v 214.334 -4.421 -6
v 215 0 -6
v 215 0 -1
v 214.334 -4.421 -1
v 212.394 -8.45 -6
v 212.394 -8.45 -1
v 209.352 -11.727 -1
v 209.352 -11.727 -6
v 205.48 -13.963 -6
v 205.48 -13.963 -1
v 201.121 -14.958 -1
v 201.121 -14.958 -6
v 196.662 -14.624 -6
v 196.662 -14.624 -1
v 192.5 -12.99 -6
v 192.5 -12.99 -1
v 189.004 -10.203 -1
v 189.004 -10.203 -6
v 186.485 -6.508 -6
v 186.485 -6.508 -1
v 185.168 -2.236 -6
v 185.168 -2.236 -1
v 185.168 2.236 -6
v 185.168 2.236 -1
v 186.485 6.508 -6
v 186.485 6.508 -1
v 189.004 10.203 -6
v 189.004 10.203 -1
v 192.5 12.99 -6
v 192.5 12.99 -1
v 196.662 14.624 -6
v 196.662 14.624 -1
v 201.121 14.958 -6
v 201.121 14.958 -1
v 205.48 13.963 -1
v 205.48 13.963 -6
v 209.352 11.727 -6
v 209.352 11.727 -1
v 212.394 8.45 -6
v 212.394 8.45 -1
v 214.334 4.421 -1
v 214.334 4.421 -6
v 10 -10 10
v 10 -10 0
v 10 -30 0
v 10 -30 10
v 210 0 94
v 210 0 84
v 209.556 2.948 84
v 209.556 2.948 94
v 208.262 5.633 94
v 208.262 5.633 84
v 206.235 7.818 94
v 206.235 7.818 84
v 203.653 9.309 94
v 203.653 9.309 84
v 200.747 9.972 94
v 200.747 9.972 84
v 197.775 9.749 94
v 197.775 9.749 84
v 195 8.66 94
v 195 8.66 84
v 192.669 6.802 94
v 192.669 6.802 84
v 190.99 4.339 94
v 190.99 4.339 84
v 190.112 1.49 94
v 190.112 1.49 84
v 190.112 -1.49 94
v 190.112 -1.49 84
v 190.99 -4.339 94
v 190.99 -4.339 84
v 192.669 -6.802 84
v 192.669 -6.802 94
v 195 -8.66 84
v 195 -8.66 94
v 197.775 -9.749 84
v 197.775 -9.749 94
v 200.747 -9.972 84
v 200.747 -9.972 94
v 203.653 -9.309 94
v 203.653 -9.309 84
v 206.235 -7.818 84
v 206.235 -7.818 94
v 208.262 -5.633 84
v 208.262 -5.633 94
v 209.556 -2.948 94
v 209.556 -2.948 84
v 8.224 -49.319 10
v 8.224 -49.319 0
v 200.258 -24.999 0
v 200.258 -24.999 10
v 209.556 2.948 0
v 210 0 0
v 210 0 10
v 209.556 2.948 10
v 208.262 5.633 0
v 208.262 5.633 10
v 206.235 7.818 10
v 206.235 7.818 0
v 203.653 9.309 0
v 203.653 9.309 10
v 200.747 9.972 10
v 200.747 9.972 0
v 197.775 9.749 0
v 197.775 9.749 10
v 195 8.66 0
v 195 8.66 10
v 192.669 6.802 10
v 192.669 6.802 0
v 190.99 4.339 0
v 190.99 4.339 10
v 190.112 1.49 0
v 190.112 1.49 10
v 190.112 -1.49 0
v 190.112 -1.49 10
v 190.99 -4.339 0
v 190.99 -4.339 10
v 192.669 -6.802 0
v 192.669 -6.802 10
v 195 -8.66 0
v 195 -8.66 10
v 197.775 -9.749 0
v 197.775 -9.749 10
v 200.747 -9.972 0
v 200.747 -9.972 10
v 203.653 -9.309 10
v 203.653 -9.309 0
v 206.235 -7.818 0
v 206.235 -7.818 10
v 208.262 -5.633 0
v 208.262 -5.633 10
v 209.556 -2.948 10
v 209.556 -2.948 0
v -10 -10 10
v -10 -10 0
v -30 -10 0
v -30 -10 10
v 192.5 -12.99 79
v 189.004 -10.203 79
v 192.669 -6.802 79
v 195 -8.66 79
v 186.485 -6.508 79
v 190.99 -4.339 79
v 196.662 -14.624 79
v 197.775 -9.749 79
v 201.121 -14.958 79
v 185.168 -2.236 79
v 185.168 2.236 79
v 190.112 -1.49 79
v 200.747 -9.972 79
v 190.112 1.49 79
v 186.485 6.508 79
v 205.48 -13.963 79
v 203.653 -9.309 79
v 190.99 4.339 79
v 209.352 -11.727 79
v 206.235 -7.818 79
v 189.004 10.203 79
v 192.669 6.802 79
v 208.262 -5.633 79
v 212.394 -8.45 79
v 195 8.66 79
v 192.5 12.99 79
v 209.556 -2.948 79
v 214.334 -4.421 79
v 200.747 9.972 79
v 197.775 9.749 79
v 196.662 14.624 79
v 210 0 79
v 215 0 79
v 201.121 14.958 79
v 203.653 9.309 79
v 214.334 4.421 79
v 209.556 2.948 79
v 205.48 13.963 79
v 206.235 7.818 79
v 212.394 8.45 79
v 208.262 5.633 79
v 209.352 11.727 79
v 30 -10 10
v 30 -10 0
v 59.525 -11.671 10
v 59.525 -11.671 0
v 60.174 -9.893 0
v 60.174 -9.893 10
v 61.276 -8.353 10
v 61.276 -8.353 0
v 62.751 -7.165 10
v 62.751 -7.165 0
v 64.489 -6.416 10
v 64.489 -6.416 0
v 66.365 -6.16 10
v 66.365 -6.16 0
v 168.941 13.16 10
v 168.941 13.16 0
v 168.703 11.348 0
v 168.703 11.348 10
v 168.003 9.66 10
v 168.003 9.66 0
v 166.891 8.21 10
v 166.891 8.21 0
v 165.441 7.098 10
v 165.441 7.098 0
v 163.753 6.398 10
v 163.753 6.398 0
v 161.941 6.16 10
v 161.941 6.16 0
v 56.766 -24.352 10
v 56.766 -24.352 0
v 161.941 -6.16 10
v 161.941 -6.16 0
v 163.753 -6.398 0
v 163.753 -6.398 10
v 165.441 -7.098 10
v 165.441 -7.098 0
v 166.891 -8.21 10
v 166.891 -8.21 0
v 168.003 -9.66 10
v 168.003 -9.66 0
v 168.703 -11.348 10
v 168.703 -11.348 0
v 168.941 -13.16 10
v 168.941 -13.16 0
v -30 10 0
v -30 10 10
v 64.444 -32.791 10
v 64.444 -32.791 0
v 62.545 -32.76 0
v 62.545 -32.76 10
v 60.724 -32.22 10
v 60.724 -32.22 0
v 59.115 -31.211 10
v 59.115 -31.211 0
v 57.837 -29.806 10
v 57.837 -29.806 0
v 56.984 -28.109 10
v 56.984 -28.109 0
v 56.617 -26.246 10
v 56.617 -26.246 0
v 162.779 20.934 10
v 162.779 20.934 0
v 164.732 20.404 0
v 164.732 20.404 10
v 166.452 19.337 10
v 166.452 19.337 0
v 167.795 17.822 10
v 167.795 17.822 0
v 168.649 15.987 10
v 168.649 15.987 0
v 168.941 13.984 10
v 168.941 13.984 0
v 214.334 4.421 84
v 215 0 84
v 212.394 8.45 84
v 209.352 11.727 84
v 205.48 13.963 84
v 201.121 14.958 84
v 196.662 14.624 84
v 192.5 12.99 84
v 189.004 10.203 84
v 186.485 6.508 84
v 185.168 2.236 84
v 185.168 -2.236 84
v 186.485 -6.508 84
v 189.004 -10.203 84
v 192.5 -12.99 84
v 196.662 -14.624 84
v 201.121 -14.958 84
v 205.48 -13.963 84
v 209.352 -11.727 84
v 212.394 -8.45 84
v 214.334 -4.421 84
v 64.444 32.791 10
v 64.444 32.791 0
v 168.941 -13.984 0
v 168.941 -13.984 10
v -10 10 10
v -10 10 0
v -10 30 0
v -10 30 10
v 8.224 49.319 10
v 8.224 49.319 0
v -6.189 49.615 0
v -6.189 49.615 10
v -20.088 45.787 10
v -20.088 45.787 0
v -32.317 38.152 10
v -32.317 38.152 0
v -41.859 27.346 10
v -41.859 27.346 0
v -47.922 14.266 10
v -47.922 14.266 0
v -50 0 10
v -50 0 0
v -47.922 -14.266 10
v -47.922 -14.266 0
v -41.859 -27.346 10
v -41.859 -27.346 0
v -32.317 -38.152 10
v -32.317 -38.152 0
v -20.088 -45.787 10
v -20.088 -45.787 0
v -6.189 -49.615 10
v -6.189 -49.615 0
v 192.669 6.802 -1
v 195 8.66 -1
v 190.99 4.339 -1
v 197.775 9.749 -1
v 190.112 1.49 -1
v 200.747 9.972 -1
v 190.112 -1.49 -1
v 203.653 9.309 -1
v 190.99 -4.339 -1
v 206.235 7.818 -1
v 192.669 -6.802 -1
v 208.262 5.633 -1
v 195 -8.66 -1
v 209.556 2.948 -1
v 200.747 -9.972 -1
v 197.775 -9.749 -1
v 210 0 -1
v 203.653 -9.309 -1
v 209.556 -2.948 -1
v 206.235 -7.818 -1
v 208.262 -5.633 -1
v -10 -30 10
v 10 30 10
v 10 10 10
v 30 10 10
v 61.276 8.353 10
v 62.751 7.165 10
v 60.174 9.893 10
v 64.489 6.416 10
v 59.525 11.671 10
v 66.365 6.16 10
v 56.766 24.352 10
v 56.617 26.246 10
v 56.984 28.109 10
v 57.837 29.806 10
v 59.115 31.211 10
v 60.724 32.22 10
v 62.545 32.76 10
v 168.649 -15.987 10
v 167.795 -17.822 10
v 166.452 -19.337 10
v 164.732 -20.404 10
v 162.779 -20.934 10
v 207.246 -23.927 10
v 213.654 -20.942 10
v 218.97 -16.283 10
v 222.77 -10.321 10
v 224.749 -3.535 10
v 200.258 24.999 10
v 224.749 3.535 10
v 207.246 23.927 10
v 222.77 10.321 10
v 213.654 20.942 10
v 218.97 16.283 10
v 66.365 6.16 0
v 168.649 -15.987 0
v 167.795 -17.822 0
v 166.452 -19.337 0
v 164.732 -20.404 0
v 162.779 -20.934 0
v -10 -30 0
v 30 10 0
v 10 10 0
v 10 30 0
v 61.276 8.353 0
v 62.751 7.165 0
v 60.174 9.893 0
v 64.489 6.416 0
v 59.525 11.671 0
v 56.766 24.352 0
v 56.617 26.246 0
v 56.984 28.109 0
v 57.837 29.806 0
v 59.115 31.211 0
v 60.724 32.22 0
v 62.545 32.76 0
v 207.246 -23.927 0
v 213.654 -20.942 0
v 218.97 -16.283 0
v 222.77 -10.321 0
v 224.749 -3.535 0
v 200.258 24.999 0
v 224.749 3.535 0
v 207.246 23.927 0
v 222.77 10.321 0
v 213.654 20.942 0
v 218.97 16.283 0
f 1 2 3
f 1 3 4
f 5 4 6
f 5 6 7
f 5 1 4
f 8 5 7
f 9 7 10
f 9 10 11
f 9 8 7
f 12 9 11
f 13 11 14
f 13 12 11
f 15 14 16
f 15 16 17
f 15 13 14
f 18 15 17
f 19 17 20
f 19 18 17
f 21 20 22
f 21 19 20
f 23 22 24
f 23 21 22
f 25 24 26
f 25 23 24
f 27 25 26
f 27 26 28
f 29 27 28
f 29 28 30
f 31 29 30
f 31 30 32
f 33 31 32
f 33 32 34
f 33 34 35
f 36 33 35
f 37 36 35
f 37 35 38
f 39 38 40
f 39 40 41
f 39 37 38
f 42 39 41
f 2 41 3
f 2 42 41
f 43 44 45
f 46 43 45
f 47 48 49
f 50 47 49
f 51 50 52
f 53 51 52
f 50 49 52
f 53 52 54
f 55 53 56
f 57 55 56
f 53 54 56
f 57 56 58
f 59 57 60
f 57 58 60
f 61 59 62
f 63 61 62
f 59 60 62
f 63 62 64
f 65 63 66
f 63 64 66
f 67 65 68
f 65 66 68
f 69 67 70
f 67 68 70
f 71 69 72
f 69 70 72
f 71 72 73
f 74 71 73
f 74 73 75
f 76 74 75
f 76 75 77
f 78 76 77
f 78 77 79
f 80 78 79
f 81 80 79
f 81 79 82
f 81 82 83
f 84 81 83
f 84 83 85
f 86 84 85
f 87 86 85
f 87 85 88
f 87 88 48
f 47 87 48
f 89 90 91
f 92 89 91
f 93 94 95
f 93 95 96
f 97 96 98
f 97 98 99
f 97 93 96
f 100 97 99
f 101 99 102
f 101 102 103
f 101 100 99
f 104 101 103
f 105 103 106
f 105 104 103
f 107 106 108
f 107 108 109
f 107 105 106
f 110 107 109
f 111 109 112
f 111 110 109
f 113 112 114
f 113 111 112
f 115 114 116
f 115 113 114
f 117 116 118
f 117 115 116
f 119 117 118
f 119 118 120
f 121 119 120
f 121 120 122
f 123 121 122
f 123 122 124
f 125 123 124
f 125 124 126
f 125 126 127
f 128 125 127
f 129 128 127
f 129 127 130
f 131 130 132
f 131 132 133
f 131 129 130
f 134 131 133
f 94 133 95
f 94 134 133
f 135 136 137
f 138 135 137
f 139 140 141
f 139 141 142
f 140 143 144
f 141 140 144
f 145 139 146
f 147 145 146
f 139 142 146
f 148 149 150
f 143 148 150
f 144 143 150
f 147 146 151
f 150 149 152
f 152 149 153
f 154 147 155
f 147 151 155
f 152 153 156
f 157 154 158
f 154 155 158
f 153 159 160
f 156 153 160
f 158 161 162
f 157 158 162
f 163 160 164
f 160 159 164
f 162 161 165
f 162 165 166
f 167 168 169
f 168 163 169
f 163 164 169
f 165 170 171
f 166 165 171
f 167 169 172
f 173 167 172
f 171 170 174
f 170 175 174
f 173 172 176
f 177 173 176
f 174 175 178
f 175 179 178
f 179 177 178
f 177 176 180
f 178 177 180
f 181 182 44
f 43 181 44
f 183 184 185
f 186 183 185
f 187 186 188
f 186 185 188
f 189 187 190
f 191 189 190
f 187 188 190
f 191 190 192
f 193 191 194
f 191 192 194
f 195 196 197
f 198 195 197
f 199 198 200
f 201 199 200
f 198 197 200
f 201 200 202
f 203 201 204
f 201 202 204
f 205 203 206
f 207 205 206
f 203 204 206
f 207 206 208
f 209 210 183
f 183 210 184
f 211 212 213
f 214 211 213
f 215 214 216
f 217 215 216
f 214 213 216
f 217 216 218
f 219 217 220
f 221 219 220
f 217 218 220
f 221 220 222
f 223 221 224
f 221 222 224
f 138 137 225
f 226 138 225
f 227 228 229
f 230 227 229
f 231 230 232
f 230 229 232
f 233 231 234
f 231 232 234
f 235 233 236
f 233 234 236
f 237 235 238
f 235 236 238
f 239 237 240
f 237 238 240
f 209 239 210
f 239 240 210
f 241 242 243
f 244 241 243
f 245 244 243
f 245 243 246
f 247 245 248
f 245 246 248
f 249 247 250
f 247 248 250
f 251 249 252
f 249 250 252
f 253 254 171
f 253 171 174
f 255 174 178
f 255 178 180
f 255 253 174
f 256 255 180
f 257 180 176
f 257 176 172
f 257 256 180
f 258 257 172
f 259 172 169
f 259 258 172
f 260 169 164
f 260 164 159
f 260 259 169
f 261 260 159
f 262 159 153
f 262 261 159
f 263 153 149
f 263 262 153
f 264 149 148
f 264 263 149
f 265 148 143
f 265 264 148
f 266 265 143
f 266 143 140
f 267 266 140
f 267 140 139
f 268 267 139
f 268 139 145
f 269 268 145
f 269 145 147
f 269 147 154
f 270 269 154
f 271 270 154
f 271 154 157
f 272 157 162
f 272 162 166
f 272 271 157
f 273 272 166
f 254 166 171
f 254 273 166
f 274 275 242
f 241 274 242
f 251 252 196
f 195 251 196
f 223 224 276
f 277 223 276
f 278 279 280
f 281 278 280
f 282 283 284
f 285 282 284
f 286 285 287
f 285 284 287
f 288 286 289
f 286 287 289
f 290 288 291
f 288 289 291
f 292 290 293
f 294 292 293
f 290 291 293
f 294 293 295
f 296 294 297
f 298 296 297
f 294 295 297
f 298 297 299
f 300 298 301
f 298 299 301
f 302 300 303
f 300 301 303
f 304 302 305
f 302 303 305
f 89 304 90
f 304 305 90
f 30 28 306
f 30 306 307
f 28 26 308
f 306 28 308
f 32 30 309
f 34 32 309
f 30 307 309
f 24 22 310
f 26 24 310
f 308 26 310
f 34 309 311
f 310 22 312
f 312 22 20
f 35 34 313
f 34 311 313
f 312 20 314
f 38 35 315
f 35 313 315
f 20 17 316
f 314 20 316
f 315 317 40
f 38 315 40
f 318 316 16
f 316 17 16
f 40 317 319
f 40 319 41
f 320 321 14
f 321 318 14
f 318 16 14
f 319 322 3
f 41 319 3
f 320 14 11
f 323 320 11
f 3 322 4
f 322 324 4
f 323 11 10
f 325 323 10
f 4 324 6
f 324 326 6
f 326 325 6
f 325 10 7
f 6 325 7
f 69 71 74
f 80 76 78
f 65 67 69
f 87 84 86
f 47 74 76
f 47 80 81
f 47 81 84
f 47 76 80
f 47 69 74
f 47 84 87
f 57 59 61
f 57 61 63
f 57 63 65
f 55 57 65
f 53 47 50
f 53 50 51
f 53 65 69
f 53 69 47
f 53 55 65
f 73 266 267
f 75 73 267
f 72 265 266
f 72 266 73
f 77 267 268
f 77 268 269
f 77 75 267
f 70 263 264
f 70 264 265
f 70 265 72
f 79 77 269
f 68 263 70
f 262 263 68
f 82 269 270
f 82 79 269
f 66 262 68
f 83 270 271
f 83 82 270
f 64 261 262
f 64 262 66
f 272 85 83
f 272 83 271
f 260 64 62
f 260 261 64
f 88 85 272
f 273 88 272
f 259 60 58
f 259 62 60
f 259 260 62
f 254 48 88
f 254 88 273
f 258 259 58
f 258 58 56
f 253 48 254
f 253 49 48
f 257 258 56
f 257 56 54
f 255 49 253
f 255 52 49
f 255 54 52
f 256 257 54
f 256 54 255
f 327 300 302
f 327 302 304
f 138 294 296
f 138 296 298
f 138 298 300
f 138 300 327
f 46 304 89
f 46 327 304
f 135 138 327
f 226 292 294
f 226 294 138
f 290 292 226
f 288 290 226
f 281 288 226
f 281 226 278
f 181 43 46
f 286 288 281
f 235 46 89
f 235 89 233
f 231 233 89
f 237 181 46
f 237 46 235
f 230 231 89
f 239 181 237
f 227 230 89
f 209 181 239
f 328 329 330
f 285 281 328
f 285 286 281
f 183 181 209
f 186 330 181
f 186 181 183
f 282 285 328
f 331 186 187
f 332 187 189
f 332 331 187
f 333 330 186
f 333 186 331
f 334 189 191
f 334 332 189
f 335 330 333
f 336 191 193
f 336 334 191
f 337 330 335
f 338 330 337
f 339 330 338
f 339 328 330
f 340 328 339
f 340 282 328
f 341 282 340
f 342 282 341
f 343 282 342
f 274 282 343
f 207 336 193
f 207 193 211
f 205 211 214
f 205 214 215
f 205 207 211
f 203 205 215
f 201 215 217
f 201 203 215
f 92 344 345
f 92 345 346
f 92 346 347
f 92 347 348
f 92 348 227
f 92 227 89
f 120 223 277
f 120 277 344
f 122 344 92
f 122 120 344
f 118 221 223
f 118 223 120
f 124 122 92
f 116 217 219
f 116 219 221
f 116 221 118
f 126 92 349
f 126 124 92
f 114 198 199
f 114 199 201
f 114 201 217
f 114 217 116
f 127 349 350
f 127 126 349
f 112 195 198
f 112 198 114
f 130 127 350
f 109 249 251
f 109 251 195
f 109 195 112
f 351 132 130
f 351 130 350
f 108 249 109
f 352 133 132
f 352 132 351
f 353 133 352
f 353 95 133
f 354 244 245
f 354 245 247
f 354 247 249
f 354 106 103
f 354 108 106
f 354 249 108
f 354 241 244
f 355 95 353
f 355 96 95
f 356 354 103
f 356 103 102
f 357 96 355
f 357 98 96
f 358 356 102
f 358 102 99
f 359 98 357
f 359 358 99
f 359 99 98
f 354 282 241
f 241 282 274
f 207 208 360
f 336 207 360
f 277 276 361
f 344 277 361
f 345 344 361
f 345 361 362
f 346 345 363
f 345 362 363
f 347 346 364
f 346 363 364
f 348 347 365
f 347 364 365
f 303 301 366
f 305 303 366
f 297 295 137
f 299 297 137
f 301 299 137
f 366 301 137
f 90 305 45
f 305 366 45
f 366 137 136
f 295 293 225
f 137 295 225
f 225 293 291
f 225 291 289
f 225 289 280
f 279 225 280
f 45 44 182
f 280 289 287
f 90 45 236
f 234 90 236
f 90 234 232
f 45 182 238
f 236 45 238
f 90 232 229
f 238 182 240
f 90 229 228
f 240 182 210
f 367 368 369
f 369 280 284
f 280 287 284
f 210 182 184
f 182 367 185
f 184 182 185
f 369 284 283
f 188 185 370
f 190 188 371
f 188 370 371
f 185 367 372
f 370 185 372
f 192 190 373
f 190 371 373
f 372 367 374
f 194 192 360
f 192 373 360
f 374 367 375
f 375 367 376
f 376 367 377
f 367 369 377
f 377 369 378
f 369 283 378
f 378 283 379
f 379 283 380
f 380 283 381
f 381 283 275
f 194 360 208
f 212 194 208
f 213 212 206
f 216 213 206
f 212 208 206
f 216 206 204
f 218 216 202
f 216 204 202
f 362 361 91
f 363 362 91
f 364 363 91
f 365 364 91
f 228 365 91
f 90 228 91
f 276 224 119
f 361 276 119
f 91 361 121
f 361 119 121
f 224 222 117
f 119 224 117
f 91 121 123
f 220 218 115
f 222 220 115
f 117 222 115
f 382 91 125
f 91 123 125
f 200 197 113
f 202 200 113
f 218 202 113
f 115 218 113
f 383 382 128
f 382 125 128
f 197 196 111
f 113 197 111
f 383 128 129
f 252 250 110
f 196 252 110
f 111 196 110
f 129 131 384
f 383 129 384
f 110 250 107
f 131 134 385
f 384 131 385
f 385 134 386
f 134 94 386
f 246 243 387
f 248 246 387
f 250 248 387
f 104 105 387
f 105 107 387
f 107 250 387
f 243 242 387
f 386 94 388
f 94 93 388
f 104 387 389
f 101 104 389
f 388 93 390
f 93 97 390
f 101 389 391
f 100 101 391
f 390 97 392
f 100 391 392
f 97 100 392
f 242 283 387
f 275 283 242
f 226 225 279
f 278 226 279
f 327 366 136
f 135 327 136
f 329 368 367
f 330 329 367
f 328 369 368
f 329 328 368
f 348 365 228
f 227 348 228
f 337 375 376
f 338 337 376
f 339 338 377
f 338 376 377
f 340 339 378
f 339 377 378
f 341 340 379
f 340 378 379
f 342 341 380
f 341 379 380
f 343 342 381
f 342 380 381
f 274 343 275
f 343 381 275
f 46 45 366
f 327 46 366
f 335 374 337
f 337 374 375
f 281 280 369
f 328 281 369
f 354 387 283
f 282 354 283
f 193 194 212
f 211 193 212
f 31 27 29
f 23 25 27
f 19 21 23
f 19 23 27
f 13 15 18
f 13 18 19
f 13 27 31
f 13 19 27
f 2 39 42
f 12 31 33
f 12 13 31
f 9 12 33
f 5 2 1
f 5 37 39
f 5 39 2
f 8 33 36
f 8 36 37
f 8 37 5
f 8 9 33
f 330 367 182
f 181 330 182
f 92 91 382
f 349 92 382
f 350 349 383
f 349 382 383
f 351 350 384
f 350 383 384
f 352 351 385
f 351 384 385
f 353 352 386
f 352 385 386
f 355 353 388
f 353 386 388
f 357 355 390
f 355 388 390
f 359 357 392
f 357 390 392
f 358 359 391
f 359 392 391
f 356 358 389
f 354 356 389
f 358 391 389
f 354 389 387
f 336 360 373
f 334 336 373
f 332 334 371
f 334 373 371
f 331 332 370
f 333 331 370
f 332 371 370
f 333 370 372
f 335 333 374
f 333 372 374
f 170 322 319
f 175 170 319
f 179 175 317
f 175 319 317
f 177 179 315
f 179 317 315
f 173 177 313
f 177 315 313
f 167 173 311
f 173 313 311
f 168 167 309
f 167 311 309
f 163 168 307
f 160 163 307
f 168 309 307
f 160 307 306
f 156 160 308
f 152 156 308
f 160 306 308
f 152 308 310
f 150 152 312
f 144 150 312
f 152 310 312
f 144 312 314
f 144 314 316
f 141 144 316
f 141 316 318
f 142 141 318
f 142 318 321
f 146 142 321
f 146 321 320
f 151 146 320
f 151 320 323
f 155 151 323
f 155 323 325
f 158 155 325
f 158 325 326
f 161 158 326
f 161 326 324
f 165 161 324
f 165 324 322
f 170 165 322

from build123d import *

# Parameters (mm, degrees)
F0_R     = 10
F1_DEPTH = 10
F2_R     = 10
F3_DEPTH = 100
F5_R     = 15
F5_R_2   = 10
F6_DEPTH = 5
F8_R     = 15
F8_R_2   = 10
F9_DEPTH = 5


with BuildPart() as f1:
    # F0 (on Top) → F1 (new body)
    with BuildSketch(Plane.XY):
        with BuildLine():
            ThreePointArc((8.2239713528, -49.3190256918), (38.1523168866, -32.3171891751), (50, 0))
            ThreePointArc((50, 0), (38.1523168866, 32.3171891751), (8.2239713528, 49.3190256918))
            ThreePointArc((8.2239713528, 49.3190256918), (-50, 0), (8.2239713528, -49.3190256918))
        make_face()
        Polygon((-10, 30), (0, 30), (10, 30), (10, 10), (30, 10), (30, 0), (30, -10), (10, -10), (10, -30), (0, -30), (-10, -30), (-10, -10), (-30, -10), (-30, 0), (-30, 10), (-10, 10), align=None, mode=Mode.SUBTRACT)
        with BuildLine():
            ThreePointArc((8.2239713528, 49.3190256918), (38.1523168866, 32.3171891751), (50, 0))
            ThreePointArc((50, 0), (38.1523168866, -32.3171891751), (8.2239713528, -49.3190256918))
            Line((8.2239713528, -49.3190256918), (200.2583432018, -24.9986651402))
            ThreePointArc((200.2583432018, -24.9986651402), (175, 0), (200.2583432018, 24.9986651402))
            Line((200.2583432018, 24.9986651402), (8.2239713528, 49.3190256918))
        make_face()
        with BuildLine():
            ThreePointArc((59.525263062, -11.6714409544), (61.973089813, -7.7092140579), (66.3651927926, -6.1598499306))
            Line((66.3651927926, -6.1598499306), (161.9411855936, -6.1598499306))
            ThreePointArc((161.9411855936, -6.1598499306), (166.8909330619, -8.2101024622), (168.9411855936, -13.1598499306))
            Line((168.9411855936, -13.1598499306), (168.9411855936, -13.984257154))
            ThreePointArc((168.9411855936, -13.984257154), (167.1788181219, -18.6283077027), (162.7791268797, -20.9339229302))
            Line((162.7791268797, -20.9339229302), (64.4436745019, -32.7905125979))
            ThreePointArc((64.4436745019, -32.7905125979), (58.428258667, -30.5518719008), (56.7658034852, -24.3524378455))
            Line((56.7658034852, -24.3524378455), (59.525263062, -11.6714409544))
        make_face(mode=Mode.SUBTRACT)
        with BuildLine():
            Line((59.525263062, 11.6714409544), (56.7658034852, 24.3524378455))
            ThreePointArc((56.7658034852, 24.3524378455), (58.428258667, 30.5518719008), (64.4436745019, 32.7905125979))
            Line((64.4436745019, 32.7905125979), (162.7791268797, 20.9339229302))
            ThreePointArc((162.7791268797, 20.9339229302), (167.1788181219, 18.6283077027), (168.9411855936, 13.984257154))
            Line((168.9411855936, 13.984257154), (168.9411855936, 13.1598499306))
            ThreePointArc((168.9411855936, 13.1598499306), (166.8909330619, 8.2101024622), (161.9411855936, 6.1598499306))
            Line((161.9411855936, 6.1598499306), (66.3651927926, 6.1598499306))
            ThreePointArc((66.3651927926, 6.1598499306), (61.973089813, 7.7092140579), (59.525263062, 11.6714409544))
        make_face(mode=Mode.SUBTRACT)
        with BuildLine():
            ThreePointArc((225, 0), (217.7687728902, 17.5860942218), (200.2583432018, 24.9986651402))
            ThreePointArc((200.2583432018, 24.9986651402), (175, 0), (200.2583432018, -24.9986651402))
            ThreePointArc((200.2583432018, -24.9986651402), (217.7687728902, -17.5860942218), (225, 0))
        make_face()
        with Locations((200, 0)):
            Circle(F0_R, mode=Mode.SUBTRACT)
    extrude(amount=F1_DEPTH)


with BuildPart() as f3:
    # F2 (on face) → F3 (new body)
    with BuildSketch(Plane.XY.offset(10)):
        with Locations((200, 0)):
            Circle(F2_R)
    extrude(amount=F3_DEPTH)


with BuildPart() as f3_1:
    # F4: moved
    add(f3.part.moved(Location((0, 0, -16))))

    # F5 (on face) → F6 (join)
    with BuildSketch(Plane(origin=(0, 0, -6), x_dir=(1, 0, 0), z_dir=(0, 0, -1))):
        with Locations((200, 0)):
            Circle(F5_R)
        with Locations((200, 0)):
            Circle(F5_R_2, mode=Mode.SUBTRACT)
    extrude(amount=-F6_DEPTH)

    # F8 (on offset) → F9 (join)
    with BuildSketch(Plane.XY.offset(84)):
        with Locations((200, 0)):
            Circle(F8_R)
        with Locations((200, 0)):
            Circle(F8_R_2, mode=Mode.SUBTRACT)
    extrude(amount=-F9_DEPTH)


solid = Compound([f1.part, f3_1.part])
